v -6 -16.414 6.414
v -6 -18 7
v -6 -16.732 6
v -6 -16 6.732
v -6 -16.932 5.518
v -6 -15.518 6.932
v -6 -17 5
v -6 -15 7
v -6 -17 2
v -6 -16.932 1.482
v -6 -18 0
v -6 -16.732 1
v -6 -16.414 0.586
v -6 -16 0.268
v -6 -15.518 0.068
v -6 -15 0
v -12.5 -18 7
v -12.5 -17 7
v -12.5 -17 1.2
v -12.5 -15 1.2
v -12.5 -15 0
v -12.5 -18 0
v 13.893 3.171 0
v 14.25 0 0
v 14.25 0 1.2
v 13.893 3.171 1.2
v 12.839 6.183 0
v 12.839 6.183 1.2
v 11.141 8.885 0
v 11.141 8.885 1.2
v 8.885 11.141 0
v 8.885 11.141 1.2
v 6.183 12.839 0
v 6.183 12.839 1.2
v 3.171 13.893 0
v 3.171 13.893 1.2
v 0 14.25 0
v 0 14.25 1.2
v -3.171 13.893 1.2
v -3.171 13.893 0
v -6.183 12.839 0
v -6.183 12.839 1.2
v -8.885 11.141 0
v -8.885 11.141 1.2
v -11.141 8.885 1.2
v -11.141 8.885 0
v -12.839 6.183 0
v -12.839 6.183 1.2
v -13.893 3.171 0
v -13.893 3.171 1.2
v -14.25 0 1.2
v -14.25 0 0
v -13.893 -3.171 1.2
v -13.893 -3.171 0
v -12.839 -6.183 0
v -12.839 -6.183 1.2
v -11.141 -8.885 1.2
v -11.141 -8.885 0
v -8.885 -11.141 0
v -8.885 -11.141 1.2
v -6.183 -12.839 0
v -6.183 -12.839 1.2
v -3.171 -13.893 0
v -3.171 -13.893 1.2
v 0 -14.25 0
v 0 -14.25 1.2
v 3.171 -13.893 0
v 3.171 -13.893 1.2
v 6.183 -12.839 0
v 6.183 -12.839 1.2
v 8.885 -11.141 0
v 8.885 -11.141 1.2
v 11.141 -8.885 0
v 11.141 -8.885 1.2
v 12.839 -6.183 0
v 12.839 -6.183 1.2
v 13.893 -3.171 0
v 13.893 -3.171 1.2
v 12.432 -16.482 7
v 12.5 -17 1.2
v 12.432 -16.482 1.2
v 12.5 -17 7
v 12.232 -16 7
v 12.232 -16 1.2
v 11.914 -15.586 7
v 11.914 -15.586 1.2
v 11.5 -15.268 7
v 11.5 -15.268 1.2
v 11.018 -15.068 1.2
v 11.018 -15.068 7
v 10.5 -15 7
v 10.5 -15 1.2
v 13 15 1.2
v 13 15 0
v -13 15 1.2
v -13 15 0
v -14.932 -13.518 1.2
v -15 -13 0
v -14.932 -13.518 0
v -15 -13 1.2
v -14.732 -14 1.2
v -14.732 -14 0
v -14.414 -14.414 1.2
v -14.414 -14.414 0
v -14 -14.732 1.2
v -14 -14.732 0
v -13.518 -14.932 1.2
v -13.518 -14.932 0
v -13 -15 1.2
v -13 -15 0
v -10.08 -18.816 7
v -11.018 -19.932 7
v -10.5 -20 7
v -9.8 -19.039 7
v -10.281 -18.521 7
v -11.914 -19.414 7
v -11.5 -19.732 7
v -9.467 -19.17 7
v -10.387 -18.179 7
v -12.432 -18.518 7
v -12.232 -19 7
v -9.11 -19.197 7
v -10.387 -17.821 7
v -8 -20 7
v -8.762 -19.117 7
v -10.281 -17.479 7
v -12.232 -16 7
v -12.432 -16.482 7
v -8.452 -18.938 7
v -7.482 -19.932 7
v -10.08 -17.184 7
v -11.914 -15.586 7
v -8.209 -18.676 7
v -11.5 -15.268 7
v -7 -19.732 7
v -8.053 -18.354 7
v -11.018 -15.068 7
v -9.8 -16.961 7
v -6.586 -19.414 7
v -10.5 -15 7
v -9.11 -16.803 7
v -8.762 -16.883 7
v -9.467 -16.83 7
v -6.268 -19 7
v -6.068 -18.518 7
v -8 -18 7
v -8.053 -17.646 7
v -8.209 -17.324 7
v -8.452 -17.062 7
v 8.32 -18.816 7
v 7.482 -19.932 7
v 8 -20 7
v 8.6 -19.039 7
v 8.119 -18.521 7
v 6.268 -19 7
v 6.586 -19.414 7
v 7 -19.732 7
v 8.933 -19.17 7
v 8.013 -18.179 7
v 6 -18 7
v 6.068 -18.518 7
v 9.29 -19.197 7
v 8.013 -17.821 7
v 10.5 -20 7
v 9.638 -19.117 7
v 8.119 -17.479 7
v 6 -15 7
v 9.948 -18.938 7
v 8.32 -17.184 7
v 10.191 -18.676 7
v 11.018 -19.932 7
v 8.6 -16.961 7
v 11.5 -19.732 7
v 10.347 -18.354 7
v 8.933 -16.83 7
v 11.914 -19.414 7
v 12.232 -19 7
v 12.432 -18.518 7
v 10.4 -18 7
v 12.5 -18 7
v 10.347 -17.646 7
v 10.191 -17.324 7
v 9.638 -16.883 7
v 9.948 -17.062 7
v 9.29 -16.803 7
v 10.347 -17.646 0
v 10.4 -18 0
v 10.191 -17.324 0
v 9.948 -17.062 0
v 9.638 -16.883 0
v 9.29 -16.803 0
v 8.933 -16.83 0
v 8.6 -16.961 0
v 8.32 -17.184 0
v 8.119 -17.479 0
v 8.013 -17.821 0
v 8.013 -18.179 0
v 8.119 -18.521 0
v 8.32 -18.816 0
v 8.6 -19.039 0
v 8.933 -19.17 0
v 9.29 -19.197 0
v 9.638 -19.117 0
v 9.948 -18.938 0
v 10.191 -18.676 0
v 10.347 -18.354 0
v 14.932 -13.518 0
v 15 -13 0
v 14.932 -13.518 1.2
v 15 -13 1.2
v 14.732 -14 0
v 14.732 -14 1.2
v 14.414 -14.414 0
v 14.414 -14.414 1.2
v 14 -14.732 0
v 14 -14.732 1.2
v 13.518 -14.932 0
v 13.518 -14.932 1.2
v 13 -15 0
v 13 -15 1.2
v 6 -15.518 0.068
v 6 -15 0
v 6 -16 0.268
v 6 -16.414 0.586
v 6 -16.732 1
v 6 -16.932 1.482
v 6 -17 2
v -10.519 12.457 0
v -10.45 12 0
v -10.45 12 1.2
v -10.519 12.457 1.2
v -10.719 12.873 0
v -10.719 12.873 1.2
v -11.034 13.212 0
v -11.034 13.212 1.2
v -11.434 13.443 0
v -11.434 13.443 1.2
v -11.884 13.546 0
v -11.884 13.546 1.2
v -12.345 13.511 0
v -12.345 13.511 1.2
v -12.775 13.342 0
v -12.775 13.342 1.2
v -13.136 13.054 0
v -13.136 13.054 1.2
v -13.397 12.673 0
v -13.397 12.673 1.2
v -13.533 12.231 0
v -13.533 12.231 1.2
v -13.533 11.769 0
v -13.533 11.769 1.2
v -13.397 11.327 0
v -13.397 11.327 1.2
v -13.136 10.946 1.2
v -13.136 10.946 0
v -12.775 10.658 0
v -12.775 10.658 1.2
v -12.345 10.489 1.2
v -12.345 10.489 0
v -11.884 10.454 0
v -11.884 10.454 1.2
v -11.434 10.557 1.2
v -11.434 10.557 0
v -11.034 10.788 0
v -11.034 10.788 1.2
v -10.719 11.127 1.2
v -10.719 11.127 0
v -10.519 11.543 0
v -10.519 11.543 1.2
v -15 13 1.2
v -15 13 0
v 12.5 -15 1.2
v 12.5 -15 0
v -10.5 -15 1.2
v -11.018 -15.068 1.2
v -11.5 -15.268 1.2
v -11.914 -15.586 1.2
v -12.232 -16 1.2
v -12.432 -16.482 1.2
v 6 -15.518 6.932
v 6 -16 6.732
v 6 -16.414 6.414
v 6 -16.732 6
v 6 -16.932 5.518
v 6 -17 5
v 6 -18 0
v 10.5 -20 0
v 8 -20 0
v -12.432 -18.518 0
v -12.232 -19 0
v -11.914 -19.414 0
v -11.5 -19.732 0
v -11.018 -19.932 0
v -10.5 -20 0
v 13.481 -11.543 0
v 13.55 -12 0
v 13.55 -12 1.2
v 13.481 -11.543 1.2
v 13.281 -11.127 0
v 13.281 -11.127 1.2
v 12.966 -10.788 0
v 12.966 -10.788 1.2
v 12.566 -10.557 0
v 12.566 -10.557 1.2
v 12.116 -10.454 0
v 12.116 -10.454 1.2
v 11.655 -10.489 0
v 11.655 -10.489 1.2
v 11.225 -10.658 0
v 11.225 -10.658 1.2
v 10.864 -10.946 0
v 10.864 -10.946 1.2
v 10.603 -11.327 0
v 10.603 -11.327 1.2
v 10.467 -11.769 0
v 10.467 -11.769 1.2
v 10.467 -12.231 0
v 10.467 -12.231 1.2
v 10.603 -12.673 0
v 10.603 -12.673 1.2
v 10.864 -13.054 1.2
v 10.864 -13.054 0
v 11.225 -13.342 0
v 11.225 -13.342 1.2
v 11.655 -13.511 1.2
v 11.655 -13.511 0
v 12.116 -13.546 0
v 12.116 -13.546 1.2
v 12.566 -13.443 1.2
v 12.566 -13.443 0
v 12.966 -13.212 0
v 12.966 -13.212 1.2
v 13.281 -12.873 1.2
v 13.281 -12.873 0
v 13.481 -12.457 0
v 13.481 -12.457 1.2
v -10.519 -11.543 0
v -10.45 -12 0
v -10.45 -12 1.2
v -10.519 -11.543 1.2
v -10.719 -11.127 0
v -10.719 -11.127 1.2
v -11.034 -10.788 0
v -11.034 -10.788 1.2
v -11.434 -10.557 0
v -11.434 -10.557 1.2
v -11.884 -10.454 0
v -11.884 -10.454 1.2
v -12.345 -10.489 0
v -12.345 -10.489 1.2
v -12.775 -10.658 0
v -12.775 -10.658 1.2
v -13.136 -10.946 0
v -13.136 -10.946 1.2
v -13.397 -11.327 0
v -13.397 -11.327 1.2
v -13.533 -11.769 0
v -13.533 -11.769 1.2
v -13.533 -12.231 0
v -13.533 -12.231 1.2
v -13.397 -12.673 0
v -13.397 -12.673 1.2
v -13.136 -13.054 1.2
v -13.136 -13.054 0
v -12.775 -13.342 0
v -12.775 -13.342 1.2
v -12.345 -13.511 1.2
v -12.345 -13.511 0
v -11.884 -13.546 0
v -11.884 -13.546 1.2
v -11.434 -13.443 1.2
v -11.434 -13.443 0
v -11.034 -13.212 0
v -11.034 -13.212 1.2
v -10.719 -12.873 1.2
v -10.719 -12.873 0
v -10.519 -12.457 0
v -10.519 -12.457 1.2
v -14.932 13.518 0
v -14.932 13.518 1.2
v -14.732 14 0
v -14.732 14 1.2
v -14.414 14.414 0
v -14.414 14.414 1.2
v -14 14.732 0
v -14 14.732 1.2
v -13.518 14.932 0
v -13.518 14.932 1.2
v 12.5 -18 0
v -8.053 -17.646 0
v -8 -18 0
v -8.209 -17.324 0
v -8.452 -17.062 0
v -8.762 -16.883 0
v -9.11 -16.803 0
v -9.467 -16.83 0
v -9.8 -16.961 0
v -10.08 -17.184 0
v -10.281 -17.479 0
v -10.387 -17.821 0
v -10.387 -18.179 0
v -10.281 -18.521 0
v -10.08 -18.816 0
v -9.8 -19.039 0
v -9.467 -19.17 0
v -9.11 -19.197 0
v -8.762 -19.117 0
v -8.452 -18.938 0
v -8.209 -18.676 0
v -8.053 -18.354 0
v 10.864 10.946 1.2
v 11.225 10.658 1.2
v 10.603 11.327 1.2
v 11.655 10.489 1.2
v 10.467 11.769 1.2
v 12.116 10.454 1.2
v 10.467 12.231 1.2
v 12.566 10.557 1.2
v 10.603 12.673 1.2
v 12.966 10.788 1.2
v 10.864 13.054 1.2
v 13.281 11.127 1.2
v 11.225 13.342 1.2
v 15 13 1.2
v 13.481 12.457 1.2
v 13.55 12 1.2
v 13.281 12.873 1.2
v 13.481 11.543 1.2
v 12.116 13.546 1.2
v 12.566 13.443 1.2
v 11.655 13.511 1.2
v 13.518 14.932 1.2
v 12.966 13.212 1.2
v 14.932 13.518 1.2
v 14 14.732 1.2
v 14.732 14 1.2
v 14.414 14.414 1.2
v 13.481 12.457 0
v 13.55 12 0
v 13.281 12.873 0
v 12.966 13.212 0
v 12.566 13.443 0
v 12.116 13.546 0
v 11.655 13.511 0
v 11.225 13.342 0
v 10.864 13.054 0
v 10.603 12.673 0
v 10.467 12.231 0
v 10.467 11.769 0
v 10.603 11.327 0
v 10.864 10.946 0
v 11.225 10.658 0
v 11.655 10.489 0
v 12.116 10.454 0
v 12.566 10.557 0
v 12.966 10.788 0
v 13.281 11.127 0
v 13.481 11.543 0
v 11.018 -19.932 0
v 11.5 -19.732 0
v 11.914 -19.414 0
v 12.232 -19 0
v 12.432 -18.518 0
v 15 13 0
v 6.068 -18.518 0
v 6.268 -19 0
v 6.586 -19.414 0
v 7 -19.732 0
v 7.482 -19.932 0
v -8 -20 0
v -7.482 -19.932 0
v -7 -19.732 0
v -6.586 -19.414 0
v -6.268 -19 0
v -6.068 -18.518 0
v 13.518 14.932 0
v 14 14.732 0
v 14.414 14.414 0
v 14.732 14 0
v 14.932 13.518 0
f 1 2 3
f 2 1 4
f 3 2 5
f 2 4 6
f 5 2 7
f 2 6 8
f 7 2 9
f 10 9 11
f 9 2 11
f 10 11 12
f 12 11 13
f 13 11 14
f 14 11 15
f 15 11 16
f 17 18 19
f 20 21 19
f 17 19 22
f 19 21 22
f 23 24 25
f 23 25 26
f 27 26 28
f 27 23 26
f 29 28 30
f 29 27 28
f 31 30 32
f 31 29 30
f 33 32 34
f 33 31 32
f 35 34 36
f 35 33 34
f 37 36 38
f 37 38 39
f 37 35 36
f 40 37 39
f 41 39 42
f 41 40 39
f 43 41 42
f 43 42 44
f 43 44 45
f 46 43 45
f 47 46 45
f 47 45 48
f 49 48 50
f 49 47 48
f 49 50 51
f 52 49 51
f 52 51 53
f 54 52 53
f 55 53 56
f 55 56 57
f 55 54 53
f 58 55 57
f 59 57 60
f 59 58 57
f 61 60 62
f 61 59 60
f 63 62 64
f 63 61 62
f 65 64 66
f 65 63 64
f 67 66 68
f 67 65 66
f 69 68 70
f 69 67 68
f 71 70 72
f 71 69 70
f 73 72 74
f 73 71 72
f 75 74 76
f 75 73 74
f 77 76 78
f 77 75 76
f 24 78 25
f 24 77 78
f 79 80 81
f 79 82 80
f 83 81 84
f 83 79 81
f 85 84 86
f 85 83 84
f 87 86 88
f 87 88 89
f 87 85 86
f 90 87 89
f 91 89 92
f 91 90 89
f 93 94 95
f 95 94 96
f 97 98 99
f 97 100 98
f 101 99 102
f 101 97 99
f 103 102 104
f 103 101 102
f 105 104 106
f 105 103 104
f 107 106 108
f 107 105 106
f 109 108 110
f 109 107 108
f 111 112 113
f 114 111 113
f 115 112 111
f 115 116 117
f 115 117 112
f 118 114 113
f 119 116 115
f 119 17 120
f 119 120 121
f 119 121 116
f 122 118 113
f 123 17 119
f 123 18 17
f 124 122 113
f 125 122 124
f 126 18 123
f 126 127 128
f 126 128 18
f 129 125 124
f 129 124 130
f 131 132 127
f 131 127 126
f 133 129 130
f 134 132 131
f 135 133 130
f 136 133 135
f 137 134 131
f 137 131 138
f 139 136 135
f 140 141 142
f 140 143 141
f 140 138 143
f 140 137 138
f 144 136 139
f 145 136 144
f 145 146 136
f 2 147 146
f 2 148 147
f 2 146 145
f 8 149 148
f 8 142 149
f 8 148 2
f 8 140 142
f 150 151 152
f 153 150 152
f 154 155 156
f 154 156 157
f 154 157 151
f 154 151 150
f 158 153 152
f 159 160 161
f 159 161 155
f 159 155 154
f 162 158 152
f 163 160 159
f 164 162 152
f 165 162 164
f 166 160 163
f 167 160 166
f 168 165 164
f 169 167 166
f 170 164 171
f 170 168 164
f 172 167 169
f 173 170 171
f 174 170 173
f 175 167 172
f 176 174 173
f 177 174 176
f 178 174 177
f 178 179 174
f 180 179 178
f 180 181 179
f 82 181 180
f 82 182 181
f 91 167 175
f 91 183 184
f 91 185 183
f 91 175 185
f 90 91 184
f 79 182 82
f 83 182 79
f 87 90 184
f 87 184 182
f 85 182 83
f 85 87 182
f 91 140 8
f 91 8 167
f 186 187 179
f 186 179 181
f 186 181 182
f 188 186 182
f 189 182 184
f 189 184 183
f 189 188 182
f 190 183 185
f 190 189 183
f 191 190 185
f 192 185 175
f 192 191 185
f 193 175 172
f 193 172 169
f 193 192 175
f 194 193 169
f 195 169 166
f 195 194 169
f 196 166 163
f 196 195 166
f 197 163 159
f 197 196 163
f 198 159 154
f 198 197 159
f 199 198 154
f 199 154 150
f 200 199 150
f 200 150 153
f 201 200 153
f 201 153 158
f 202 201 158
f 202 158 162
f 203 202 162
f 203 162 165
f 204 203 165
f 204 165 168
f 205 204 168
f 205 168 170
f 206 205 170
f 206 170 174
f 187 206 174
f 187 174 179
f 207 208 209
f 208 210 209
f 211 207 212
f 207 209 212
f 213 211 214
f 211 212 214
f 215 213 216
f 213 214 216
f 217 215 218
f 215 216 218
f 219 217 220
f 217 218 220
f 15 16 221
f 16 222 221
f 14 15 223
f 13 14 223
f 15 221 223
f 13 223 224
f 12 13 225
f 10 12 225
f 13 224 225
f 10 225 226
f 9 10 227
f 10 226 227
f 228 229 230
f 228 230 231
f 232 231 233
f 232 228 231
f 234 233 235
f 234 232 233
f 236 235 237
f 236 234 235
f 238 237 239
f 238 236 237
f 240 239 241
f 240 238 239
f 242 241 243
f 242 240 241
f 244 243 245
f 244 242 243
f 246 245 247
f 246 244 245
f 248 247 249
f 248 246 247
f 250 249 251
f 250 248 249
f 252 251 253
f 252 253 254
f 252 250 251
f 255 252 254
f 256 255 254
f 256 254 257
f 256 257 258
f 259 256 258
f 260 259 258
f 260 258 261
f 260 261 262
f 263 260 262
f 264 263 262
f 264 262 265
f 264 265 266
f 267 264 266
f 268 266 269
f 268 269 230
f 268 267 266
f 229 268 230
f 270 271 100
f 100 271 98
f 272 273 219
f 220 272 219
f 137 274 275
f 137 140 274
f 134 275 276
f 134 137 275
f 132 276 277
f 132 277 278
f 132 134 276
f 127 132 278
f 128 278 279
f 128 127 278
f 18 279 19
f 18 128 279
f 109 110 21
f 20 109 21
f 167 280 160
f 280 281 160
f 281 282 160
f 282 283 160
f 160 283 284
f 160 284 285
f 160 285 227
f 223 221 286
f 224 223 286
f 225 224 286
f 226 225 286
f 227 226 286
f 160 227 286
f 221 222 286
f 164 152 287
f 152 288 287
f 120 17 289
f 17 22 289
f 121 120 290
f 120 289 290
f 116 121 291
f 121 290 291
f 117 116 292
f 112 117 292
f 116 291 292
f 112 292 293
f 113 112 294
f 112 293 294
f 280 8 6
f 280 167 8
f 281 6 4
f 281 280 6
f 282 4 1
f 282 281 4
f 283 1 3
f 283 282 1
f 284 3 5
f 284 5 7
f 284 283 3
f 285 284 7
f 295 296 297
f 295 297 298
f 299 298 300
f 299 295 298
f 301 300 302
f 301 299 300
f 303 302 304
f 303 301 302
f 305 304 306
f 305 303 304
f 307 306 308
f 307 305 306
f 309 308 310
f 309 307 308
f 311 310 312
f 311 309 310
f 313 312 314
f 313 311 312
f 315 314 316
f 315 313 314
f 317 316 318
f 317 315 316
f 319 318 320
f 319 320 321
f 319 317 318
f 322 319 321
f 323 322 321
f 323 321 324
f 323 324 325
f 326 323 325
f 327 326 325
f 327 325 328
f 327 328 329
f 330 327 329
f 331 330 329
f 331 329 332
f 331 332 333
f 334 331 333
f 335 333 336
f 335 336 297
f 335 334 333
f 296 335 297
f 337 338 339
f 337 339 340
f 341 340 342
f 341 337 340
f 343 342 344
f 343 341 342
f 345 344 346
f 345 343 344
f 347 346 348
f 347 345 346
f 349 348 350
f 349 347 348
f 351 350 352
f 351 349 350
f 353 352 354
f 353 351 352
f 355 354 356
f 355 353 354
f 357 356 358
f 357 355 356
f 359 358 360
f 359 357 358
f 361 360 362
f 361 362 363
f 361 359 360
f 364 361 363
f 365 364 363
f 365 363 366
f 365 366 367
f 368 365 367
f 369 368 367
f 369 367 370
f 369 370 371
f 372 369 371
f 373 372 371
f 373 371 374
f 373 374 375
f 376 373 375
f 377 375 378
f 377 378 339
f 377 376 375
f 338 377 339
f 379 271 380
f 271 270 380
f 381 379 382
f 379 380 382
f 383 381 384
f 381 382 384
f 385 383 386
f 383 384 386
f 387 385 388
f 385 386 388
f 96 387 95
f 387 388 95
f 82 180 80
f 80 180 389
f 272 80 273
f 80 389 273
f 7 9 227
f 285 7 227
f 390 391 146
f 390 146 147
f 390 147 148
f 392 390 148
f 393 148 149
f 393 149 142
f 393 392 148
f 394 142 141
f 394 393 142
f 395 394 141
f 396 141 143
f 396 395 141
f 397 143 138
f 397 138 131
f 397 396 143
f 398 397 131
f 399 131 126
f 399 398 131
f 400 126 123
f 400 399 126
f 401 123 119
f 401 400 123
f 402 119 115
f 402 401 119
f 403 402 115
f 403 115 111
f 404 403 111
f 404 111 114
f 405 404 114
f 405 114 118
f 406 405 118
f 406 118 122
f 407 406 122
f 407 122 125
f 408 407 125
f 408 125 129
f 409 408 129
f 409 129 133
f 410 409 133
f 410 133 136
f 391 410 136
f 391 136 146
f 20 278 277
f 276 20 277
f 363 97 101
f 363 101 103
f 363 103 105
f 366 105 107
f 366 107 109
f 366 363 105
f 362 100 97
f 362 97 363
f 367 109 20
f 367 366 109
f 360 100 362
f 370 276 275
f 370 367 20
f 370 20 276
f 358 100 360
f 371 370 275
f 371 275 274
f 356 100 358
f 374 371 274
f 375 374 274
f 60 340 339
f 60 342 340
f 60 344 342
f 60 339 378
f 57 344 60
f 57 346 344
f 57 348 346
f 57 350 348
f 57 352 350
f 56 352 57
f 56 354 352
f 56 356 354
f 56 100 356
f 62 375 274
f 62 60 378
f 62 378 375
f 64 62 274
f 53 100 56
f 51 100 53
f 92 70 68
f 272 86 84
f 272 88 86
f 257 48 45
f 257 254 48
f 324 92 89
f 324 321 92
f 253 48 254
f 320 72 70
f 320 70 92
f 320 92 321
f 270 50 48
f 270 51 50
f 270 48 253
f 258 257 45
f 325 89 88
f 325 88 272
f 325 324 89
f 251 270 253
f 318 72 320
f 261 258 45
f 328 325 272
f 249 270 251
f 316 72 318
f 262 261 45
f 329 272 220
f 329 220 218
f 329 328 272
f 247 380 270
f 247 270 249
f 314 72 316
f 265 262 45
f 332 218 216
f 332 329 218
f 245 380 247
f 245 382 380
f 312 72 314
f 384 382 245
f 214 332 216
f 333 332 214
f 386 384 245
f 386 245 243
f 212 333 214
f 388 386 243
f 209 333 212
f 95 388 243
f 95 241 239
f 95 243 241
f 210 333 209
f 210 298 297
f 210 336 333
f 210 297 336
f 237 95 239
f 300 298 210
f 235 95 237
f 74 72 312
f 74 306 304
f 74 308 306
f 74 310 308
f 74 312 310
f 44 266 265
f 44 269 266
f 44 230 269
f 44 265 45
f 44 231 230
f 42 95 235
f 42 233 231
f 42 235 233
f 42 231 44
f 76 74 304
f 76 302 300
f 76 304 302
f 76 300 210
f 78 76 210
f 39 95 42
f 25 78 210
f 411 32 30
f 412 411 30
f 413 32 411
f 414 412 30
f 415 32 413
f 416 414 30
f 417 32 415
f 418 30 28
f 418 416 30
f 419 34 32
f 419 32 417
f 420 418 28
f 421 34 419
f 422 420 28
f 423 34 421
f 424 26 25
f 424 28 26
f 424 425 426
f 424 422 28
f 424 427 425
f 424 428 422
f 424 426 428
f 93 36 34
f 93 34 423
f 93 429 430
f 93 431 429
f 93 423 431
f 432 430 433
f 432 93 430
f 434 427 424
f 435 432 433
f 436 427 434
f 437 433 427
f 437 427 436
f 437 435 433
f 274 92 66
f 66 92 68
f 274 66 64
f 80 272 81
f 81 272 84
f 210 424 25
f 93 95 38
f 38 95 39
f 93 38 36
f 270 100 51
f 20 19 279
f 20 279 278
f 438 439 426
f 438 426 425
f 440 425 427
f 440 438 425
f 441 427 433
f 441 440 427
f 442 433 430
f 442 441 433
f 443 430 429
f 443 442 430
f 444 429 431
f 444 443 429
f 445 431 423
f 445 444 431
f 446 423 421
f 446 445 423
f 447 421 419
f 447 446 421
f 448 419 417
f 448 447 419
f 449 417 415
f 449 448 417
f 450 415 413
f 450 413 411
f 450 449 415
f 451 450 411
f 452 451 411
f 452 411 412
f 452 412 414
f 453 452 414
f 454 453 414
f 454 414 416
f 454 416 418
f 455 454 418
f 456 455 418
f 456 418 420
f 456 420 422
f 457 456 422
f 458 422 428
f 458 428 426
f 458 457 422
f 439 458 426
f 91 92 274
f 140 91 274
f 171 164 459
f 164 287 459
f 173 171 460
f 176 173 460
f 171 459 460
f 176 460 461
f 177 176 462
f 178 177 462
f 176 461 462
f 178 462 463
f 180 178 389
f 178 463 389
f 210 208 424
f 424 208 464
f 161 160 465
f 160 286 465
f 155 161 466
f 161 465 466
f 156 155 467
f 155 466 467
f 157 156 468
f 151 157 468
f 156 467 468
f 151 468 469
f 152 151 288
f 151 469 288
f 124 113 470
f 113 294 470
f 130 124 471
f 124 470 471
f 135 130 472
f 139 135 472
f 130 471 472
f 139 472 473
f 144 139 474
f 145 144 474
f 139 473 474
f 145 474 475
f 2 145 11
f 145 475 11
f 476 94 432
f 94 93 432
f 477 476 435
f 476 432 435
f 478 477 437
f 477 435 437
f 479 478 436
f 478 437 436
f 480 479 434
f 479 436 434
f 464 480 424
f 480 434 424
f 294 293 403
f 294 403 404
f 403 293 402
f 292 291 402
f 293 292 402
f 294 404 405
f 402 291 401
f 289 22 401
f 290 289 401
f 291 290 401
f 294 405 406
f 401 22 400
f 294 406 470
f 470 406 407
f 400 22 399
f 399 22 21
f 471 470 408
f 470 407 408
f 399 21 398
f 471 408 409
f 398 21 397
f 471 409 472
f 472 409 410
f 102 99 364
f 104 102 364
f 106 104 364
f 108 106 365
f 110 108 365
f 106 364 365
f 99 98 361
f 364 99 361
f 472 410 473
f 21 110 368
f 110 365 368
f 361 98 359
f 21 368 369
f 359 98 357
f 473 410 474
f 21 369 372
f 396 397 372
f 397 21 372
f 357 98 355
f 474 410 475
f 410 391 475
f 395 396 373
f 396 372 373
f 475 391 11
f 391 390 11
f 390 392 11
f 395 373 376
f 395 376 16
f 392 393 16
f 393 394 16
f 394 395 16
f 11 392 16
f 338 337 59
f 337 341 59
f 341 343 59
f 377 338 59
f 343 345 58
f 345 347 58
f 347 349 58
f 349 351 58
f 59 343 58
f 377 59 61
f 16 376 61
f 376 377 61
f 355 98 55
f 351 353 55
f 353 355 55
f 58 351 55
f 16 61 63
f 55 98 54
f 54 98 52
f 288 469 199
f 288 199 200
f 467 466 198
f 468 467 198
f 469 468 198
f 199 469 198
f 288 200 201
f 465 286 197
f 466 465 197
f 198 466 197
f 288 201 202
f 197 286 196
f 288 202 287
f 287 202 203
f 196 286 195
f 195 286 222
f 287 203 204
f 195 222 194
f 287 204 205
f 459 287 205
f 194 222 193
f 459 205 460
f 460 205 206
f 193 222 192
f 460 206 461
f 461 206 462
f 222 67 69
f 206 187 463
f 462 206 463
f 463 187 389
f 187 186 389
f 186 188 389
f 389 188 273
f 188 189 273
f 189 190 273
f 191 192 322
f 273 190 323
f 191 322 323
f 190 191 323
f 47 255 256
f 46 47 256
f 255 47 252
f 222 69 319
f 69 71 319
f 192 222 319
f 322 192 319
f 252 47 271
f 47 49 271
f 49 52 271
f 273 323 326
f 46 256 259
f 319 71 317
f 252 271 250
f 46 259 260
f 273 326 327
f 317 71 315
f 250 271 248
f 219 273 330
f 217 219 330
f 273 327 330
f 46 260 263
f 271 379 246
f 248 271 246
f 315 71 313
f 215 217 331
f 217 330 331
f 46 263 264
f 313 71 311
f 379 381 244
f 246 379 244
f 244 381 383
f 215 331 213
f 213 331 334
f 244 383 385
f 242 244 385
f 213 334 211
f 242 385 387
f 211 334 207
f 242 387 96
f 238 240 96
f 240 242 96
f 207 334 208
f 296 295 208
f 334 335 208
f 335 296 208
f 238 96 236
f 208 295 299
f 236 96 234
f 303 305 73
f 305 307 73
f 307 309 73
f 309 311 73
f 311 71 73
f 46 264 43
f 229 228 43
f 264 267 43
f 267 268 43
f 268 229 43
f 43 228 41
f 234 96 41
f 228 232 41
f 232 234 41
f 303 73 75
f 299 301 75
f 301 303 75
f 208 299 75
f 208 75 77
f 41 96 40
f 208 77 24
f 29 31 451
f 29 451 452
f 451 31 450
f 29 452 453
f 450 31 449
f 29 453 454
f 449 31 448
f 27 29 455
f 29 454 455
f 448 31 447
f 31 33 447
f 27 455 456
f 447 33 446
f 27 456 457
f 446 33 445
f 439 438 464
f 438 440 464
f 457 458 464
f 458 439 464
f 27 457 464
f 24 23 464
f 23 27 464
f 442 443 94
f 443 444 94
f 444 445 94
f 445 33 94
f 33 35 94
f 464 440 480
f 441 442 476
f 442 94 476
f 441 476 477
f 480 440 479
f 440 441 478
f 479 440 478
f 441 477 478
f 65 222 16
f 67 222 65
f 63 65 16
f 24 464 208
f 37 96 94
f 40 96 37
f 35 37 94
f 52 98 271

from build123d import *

# Parameters (mm, degrees)
F0_R     = 1.55
F0_R_2   = 14.25
F0_R_3   = 1.2
F0_W     = 12
F0_H     = 2
F1_DEPTH = 1.2
F2_DEPTH = 7
F3_R     = 2
F3_R_2   = 1.99999


# Not quite as in the source:
# - a fillet or chamfer is up to 0.001 mm smaller than in the source, because OpenCascade refuses the exact size


with BuildPart() as f1:
    # F0 (on Top) → F1 (new body)
    with BuildSketch(Plane.XY):
        Polygon((12.5, -15), (15, -15), (15, 15), (-15, 15), (-15, -15), (-12.5, -15), (-6, -15), (6, -15), align=None)
        with Locations((-12, -12)):
            Circle(F0_R, mode=Mode.SUBTRACT)
        with Locations((12, -12)):
            Circle(F0_R, mode=Mode.SUBTRACT)
        with Locations((-12, 12)):
            Circle(F0_R, mode=Mode.SUBTRACT)
        Circle(F0_R_2, mode=Mode.SUBTRACT)
        with Locations((12, 12)):
            Circle(F0_R, mode=Mode.SUBTRACT)
        Polygon((-6, -17), (-6, -15), (-12.5, -15), (-12.5, -20), (-6, -20), align=None)
        with Locations((-9.2, -18)):
            Circle(F0_R_3, mode=Mode.SUBTRACT)
        with Locations((0, -16)):
            Rectangle(F0_W, F0_H)
        Polygon((12.5, -20), (12.5, -15), (6, -15), (6, -17), (6, -20), align=None)
        with Locations((9.2, -18)):
            Circle(F0_R_3, mode=Mode.SUBTRACT)
    extrude(amount=F1_DEPTH)

    # F0 (on Top) → F2 (join)
    with BuildSketch(Plane.XY):
        with Locations((0, -16)):
            Rectangle(F0_W, F0_H)
        Polygon((-6, -17), (-6, -15), (-12.5, -15), (-12.5, -20), (-6, -20), align=None)
        with Locations((-9.2, -18)):
            Circle(F0_R_3, mode=Mode.SUBTRACT)
        Polygon((12.5, -20), (12.5, -15), (6, -15), (6, -17), (6, -20), align=None)
        with Locations((9.2, -18)):
            Circle(F0_R_3, mode=Mode.SUBTRACT)
    extrude(amount=F2_DEPTH)

    # F3 (call 1 of 12: OpenCascade refuses the feature's edges together)
    f3_edges = [f1.edges().sort_by_distance(p)[0] for p in [
        (15, -15, 0.6),
    ]]
    fillet(f3_edges, radius=F3_R)

    # F3#2 (call 2 of 12)
    f3_2_edges = [f1.edges().sort_by_distance(p)[0] for p in [
        (-15, -15, 0.6),
    ]]
    fillet(f3_2_edges, radius=F3_R)

    # F3#3 (call 3 of 12)
    f3_3_edges = [f1.edges().sort_by_distance(p)[0] for p in [
        (-15, 15, 0.6),
    ]]
    fillet(f3_3_edges, radius=F3_R)

    # F3#4 (call 4 of 12)
    f3_4_edges = [f1.edges().sort_by_distance(p)[0] for p in [
        (15, 15, 0.6),
    ]]
    fillet(f3_4_edges, radius=F3_R)

    # F3#5 (call 5 of 12)
    f3_5_edges = [f1.edges().sort_by_distance(p)[0] for p in [
        (-12.5, -20, 3.5),
    ]]
    fillet(f3_5_edges, radius=F3_R)

    # F3#6 (call 6 of 12)
    f3_6_edges = [f1.edges().sort_by_distance(p)[0] for p in [
        (-6, -20, 3.5),
    ]]
    fillet(f3_6_edges, radius=F3_R)

    # F3#7 (call 7 of 12)
    f3_7_edges = [f1.edges().sort_by_distance(p)[0] for p in [
        (6, -20, 3.5),
    ]]
    fillet(f3_7_edges, radius=F3_R)

    # F3#8 (call 8 of 12)
    f3_8_edges = [f1.edges().sort_by_distance(p)[0] for p in [
        (12.5, -20, 3.5),
    ]]
    fillet(f3_8_edges, radius=F3_R)

    # F3#9 (call 9 of 12)
    f3_9_edges = [f1.edges().sort_by_distance(p)[0] for p in [
        (12.5, -15, 4.1),
    ]]
    fillet(f3_9_edges, radius=F3_R)

    # F3#10 (call 10 of 12)
    f3_10_edges = [f1.edges().sort_by_distance(p)[0] for p in [
        (-12.5, -15, 4.1),
    ]]
    fillet(f3_10_edges, radius=F3_R)

    # F3#11 (call 11 of 12) (radius 2 in the source; OpenCascade refuses exactly that, so slightly less here)
    f3_11_edges = [f1.edges().sort_by_distance(p)[0] for p in [
        (0, -17, 7),
    ]]
    fillet(f3_11_edges, radius=F3_R_2)

    # F3#12 (call 12 of 12)
    f3_12_edges = [f1.edges().sort_by_distance(p)[0] for p in [
        (0, -17, 0),
    ]]
    fillet(f3_12_edges, radius=F3_R)


solid = f1.part
